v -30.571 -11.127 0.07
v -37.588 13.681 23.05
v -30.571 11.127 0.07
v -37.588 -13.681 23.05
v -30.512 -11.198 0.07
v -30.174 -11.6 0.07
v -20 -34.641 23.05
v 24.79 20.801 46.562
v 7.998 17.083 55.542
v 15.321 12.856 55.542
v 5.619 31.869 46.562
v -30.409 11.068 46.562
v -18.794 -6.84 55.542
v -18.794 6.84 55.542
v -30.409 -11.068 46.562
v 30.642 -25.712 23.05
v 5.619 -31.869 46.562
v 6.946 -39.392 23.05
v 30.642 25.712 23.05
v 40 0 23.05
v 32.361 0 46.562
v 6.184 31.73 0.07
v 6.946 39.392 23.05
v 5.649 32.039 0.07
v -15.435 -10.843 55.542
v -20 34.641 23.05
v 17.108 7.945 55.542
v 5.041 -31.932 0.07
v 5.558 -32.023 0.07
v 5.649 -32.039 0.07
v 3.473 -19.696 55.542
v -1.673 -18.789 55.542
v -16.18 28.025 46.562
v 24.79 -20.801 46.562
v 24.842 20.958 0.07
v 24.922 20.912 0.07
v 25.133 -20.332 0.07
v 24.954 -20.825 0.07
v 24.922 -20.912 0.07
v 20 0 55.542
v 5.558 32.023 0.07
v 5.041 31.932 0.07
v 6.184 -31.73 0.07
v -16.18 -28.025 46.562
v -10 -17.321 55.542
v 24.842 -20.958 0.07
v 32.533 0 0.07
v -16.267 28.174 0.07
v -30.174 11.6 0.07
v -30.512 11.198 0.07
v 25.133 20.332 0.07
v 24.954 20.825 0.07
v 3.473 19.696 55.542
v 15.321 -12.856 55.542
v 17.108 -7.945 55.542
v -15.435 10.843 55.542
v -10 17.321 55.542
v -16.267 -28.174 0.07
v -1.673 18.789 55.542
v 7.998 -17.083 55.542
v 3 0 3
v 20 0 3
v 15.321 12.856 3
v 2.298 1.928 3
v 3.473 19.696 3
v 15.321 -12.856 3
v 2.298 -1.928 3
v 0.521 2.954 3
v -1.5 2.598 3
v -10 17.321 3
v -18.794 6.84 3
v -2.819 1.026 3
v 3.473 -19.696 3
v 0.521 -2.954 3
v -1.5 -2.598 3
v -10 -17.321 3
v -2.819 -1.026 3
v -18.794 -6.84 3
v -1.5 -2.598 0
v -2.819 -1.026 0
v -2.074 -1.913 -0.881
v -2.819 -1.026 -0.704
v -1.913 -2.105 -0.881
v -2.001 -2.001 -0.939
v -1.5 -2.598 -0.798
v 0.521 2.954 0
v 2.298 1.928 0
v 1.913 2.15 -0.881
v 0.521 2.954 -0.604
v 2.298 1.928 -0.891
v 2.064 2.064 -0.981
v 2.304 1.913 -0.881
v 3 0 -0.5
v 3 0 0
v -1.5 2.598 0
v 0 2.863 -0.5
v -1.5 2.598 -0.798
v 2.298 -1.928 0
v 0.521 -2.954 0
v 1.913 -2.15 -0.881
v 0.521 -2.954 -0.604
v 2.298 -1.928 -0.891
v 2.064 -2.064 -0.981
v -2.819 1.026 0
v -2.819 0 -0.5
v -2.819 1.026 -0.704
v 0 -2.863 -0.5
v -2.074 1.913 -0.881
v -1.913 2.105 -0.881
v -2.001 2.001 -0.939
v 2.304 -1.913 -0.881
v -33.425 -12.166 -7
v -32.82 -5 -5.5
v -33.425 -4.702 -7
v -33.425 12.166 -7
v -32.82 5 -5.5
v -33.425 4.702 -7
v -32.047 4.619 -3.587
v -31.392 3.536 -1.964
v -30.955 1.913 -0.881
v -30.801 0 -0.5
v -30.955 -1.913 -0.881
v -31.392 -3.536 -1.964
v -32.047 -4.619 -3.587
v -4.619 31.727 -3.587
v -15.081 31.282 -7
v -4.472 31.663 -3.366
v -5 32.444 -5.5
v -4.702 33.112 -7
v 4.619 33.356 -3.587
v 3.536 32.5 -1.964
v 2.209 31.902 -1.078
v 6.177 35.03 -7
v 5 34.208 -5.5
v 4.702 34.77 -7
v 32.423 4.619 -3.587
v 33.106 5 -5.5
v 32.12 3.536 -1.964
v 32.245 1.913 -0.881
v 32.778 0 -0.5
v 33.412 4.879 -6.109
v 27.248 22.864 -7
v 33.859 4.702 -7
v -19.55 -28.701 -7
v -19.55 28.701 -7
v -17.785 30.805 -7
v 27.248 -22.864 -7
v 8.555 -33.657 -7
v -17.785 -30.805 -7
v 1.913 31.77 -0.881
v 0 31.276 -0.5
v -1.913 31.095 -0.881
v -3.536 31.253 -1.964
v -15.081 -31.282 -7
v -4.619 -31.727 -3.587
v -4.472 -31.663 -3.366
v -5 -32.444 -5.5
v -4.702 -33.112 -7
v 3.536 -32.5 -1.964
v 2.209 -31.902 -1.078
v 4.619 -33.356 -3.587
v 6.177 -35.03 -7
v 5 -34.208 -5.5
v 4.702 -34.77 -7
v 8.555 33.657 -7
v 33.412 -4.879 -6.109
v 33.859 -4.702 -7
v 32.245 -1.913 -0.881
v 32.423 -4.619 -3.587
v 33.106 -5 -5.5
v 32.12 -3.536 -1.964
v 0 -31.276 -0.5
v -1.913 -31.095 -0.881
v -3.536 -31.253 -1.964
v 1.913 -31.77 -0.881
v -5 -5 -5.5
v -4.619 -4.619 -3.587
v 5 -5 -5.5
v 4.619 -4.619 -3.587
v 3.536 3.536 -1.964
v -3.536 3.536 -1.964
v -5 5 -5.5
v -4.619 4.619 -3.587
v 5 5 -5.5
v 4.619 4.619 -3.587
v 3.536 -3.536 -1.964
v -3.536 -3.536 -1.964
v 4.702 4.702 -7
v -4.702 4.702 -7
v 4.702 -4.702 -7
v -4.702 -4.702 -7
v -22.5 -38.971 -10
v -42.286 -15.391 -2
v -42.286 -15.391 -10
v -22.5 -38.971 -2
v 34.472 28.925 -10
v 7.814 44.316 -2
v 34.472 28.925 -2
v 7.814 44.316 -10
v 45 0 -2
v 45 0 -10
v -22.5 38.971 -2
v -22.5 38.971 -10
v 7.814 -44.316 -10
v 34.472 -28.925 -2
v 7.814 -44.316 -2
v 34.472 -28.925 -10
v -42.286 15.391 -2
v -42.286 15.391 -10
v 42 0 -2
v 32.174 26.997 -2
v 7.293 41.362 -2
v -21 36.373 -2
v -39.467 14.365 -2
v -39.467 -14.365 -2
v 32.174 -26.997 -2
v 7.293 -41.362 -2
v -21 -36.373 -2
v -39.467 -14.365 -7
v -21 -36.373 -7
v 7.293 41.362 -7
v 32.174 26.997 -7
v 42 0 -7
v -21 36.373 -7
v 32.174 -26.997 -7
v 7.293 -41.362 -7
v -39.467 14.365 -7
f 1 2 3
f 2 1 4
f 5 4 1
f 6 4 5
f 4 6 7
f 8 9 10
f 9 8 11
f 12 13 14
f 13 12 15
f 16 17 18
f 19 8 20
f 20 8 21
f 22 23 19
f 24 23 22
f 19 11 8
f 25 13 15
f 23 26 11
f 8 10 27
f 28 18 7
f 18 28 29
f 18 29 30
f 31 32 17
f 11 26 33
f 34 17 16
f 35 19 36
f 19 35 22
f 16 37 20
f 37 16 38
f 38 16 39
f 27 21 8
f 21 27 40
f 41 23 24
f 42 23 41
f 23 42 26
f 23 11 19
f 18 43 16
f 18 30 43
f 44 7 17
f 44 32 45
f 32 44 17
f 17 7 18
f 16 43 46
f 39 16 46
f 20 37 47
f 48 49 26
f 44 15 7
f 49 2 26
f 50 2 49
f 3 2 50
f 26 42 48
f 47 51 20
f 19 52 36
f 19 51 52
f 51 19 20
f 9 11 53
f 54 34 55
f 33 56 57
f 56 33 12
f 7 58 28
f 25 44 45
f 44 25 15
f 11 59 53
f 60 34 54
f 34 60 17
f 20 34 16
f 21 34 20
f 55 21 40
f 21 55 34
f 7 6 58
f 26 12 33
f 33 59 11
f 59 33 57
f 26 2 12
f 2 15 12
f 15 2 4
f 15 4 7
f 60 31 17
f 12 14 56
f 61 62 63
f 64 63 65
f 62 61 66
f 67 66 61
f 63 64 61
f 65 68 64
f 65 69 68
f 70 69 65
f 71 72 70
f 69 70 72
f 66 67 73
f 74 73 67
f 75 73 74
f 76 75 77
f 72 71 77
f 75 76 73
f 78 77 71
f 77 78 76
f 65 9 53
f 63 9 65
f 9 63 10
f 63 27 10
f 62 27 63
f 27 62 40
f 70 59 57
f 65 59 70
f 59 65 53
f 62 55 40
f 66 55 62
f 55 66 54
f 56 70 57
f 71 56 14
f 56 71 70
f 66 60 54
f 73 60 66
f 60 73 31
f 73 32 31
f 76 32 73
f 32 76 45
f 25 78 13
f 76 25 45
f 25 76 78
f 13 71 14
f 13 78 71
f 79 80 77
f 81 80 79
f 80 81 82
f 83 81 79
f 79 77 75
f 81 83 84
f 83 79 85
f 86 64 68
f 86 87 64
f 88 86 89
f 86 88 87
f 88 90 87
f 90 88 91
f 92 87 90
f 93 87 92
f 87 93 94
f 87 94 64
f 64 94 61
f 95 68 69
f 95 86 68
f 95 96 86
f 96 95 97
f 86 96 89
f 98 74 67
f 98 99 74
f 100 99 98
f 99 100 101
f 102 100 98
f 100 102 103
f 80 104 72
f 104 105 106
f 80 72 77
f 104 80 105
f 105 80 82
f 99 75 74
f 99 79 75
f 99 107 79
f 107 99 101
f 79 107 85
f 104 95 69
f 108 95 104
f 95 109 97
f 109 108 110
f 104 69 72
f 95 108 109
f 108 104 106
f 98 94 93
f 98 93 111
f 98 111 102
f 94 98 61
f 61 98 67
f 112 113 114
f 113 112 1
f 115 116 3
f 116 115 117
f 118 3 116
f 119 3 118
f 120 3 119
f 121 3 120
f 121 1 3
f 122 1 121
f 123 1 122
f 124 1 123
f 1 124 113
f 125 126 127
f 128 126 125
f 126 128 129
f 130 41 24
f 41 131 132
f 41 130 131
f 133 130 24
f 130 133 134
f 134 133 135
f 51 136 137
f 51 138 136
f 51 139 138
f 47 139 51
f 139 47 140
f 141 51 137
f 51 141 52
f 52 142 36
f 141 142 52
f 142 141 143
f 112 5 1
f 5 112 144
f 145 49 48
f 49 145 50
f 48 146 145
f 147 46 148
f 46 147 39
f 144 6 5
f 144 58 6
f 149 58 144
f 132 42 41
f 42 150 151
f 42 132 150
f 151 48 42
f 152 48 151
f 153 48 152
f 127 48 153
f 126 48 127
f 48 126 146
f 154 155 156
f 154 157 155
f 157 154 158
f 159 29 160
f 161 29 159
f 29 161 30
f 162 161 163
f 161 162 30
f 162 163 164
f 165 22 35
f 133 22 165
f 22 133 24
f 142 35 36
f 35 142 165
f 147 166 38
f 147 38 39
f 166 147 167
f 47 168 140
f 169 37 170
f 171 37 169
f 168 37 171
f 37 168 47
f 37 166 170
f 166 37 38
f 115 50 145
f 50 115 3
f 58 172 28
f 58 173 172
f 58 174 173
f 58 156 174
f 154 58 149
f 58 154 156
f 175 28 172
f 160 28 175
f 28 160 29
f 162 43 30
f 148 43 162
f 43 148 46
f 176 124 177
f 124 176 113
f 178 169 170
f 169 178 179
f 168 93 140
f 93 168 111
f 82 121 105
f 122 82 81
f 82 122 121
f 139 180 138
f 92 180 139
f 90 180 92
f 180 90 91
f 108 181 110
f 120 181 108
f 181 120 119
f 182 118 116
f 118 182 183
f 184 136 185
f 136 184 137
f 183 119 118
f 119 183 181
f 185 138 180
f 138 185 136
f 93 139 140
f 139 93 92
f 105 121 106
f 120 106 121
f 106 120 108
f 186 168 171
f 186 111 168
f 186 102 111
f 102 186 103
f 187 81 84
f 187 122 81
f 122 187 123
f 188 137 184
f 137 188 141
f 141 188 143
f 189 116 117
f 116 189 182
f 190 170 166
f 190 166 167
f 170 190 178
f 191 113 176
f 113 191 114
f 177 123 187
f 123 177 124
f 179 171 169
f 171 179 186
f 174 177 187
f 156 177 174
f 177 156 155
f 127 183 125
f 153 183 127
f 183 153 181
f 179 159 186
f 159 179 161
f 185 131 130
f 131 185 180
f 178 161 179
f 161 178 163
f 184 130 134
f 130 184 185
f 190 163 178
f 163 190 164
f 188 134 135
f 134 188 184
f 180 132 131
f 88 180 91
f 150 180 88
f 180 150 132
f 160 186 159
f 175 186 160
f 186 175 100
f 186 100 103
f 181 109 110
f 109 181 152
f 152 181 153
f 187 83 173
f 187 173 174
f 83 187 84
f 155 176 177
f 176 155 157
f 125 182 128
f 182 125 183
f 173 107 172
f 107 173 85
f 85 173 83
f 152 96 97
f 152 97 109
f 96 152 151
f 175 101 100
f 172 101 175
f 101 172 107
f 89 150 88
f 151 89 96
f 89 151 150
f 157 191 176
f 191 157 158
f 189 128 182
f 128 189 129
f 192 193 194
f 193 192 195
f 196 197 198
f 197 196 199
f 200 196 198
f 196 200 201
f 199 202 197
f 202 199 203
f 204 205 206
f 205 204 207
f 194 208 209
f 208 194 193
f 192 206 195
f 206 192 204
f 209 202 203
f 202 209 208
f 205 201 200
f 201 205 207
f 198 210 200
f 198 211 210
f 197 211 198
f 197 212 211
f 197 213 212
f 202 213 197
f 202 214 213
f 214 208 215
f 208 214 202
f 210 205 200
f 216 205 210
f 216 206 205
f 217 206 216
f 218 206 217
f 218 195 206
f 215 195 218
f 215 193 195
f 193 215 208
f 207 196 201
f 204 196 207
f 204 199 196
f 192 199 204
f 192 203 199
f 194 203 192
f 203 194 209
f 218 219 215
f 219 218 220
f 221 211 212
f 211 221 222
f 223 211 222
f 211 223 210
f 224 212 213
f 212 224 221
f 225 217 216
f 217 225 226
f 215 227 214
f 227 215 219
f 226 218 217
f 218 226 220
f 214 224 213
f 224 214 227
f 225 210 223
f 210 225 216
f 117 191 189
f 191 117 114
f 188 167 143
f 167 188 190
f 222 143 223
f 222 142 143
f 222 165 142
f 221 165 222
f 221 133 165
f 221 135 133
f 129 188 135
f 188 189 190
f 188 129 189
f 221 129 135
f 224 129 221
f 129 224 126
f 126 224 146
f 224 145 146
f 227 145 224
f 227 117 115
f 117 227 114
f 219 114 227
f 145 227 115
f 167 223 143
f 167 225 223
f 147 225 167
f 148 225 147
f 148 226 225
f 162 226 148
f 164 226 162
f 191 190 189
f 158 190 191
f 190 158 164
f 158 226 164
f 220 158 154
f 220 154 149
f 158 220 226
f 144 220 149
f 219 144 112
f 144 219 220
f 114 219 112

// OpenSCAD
/*******************************************************************************  
* Program Name:  POLYPOT
* Created Date:  8/20/2016
* Created By:  M. Graham Cottone
* Purpose: Geometric planter with dranage dish
******************************************************************************** 
POLYPOT (c) by M. Graham Cottone

POLYPOT is licensed under a
Creative Commons Attribution-NonCommercial-ShareAlike 4.0 International License.

You should have received a copy of the license along with this
work. If not, see <http://creativecommons.org/licenses/by-nc-sa/4.0/>.
*******************************************************************************/


//radus of outer width of widest part of main object(top most part)(radus of dish += 5)
rad=40;
//inner radus of the planter
centerHole = 20;
//radus of dranage hole in center of pot
drainHole = 3;
//height of base 
baseHeight= 8;
//half of the width of dranage pipes running through the base
drainPipeWidth= 5;
//depth of the dranage dish 
dishDepth= 5;



//this variable affects the number of sides of the object based on the angle and some fancy trigonometric functions, the math is set for this to be 40, some parts may not align properly if this number is changed.
angle = 40;




//the main object (planter its self)
difference() {
    
    translate ([0, 0, .63*(rad*cos(.5*angle)-1) ])
        sphere($fa=angle, rad );

//cuts out the center hole for plants to live in 
    translate([0,0,3,])
        cylinder($fa=angle, 2*rad,centerHole,centerHole);
        
//cuts extra off bottom at edge
    translate([-rad,-rad,-rad])
        cube([2*rad,2*rad,rad]);

//cuts out drainage hole
     translate([0,0,-3,])
        cylinder($fa=angle, 2*rad,drainHole,drainHole);
}


//the base
difference() {
    translate([0,0,-baseHeight,])
        cylinder($fa=angle, baseHeight+.1,.9*rad,.813*rad);
    
//continues the drainage hole into the base
    translate([0,0,-baseHeight,])
        cylinder($fa=angle, 2*rad,drainHole,drainHole);

//cutout for drain pipe one
    rotate([0,90,0])
 translate([baseHeight-.5*drainPipeWidth,0,-rad,])
        cylinder( 2*rad,drainPipeWidth,drainPipeWidth);

//cutout for drain pipe two
    rotate([90,0,0])
    translate([0,.5*drainPipeWidth-baseHeight,-rad,])
        cylinder( 2*rad,drainPipeWidth,drainPipeWidth);  
}

//the bottom dish
translate ([0, 0,-baseHeight-2 ])
difference() {
    
    translate ([0, 0,0 ])
        cylinder($fa=angle, dishDepth+3,rad+5,rad+5);
       
   
    translate ([0, 0,3 ])
        cylinder($fa=angle, dishDepth+3,rad+2,rad+2);
}


